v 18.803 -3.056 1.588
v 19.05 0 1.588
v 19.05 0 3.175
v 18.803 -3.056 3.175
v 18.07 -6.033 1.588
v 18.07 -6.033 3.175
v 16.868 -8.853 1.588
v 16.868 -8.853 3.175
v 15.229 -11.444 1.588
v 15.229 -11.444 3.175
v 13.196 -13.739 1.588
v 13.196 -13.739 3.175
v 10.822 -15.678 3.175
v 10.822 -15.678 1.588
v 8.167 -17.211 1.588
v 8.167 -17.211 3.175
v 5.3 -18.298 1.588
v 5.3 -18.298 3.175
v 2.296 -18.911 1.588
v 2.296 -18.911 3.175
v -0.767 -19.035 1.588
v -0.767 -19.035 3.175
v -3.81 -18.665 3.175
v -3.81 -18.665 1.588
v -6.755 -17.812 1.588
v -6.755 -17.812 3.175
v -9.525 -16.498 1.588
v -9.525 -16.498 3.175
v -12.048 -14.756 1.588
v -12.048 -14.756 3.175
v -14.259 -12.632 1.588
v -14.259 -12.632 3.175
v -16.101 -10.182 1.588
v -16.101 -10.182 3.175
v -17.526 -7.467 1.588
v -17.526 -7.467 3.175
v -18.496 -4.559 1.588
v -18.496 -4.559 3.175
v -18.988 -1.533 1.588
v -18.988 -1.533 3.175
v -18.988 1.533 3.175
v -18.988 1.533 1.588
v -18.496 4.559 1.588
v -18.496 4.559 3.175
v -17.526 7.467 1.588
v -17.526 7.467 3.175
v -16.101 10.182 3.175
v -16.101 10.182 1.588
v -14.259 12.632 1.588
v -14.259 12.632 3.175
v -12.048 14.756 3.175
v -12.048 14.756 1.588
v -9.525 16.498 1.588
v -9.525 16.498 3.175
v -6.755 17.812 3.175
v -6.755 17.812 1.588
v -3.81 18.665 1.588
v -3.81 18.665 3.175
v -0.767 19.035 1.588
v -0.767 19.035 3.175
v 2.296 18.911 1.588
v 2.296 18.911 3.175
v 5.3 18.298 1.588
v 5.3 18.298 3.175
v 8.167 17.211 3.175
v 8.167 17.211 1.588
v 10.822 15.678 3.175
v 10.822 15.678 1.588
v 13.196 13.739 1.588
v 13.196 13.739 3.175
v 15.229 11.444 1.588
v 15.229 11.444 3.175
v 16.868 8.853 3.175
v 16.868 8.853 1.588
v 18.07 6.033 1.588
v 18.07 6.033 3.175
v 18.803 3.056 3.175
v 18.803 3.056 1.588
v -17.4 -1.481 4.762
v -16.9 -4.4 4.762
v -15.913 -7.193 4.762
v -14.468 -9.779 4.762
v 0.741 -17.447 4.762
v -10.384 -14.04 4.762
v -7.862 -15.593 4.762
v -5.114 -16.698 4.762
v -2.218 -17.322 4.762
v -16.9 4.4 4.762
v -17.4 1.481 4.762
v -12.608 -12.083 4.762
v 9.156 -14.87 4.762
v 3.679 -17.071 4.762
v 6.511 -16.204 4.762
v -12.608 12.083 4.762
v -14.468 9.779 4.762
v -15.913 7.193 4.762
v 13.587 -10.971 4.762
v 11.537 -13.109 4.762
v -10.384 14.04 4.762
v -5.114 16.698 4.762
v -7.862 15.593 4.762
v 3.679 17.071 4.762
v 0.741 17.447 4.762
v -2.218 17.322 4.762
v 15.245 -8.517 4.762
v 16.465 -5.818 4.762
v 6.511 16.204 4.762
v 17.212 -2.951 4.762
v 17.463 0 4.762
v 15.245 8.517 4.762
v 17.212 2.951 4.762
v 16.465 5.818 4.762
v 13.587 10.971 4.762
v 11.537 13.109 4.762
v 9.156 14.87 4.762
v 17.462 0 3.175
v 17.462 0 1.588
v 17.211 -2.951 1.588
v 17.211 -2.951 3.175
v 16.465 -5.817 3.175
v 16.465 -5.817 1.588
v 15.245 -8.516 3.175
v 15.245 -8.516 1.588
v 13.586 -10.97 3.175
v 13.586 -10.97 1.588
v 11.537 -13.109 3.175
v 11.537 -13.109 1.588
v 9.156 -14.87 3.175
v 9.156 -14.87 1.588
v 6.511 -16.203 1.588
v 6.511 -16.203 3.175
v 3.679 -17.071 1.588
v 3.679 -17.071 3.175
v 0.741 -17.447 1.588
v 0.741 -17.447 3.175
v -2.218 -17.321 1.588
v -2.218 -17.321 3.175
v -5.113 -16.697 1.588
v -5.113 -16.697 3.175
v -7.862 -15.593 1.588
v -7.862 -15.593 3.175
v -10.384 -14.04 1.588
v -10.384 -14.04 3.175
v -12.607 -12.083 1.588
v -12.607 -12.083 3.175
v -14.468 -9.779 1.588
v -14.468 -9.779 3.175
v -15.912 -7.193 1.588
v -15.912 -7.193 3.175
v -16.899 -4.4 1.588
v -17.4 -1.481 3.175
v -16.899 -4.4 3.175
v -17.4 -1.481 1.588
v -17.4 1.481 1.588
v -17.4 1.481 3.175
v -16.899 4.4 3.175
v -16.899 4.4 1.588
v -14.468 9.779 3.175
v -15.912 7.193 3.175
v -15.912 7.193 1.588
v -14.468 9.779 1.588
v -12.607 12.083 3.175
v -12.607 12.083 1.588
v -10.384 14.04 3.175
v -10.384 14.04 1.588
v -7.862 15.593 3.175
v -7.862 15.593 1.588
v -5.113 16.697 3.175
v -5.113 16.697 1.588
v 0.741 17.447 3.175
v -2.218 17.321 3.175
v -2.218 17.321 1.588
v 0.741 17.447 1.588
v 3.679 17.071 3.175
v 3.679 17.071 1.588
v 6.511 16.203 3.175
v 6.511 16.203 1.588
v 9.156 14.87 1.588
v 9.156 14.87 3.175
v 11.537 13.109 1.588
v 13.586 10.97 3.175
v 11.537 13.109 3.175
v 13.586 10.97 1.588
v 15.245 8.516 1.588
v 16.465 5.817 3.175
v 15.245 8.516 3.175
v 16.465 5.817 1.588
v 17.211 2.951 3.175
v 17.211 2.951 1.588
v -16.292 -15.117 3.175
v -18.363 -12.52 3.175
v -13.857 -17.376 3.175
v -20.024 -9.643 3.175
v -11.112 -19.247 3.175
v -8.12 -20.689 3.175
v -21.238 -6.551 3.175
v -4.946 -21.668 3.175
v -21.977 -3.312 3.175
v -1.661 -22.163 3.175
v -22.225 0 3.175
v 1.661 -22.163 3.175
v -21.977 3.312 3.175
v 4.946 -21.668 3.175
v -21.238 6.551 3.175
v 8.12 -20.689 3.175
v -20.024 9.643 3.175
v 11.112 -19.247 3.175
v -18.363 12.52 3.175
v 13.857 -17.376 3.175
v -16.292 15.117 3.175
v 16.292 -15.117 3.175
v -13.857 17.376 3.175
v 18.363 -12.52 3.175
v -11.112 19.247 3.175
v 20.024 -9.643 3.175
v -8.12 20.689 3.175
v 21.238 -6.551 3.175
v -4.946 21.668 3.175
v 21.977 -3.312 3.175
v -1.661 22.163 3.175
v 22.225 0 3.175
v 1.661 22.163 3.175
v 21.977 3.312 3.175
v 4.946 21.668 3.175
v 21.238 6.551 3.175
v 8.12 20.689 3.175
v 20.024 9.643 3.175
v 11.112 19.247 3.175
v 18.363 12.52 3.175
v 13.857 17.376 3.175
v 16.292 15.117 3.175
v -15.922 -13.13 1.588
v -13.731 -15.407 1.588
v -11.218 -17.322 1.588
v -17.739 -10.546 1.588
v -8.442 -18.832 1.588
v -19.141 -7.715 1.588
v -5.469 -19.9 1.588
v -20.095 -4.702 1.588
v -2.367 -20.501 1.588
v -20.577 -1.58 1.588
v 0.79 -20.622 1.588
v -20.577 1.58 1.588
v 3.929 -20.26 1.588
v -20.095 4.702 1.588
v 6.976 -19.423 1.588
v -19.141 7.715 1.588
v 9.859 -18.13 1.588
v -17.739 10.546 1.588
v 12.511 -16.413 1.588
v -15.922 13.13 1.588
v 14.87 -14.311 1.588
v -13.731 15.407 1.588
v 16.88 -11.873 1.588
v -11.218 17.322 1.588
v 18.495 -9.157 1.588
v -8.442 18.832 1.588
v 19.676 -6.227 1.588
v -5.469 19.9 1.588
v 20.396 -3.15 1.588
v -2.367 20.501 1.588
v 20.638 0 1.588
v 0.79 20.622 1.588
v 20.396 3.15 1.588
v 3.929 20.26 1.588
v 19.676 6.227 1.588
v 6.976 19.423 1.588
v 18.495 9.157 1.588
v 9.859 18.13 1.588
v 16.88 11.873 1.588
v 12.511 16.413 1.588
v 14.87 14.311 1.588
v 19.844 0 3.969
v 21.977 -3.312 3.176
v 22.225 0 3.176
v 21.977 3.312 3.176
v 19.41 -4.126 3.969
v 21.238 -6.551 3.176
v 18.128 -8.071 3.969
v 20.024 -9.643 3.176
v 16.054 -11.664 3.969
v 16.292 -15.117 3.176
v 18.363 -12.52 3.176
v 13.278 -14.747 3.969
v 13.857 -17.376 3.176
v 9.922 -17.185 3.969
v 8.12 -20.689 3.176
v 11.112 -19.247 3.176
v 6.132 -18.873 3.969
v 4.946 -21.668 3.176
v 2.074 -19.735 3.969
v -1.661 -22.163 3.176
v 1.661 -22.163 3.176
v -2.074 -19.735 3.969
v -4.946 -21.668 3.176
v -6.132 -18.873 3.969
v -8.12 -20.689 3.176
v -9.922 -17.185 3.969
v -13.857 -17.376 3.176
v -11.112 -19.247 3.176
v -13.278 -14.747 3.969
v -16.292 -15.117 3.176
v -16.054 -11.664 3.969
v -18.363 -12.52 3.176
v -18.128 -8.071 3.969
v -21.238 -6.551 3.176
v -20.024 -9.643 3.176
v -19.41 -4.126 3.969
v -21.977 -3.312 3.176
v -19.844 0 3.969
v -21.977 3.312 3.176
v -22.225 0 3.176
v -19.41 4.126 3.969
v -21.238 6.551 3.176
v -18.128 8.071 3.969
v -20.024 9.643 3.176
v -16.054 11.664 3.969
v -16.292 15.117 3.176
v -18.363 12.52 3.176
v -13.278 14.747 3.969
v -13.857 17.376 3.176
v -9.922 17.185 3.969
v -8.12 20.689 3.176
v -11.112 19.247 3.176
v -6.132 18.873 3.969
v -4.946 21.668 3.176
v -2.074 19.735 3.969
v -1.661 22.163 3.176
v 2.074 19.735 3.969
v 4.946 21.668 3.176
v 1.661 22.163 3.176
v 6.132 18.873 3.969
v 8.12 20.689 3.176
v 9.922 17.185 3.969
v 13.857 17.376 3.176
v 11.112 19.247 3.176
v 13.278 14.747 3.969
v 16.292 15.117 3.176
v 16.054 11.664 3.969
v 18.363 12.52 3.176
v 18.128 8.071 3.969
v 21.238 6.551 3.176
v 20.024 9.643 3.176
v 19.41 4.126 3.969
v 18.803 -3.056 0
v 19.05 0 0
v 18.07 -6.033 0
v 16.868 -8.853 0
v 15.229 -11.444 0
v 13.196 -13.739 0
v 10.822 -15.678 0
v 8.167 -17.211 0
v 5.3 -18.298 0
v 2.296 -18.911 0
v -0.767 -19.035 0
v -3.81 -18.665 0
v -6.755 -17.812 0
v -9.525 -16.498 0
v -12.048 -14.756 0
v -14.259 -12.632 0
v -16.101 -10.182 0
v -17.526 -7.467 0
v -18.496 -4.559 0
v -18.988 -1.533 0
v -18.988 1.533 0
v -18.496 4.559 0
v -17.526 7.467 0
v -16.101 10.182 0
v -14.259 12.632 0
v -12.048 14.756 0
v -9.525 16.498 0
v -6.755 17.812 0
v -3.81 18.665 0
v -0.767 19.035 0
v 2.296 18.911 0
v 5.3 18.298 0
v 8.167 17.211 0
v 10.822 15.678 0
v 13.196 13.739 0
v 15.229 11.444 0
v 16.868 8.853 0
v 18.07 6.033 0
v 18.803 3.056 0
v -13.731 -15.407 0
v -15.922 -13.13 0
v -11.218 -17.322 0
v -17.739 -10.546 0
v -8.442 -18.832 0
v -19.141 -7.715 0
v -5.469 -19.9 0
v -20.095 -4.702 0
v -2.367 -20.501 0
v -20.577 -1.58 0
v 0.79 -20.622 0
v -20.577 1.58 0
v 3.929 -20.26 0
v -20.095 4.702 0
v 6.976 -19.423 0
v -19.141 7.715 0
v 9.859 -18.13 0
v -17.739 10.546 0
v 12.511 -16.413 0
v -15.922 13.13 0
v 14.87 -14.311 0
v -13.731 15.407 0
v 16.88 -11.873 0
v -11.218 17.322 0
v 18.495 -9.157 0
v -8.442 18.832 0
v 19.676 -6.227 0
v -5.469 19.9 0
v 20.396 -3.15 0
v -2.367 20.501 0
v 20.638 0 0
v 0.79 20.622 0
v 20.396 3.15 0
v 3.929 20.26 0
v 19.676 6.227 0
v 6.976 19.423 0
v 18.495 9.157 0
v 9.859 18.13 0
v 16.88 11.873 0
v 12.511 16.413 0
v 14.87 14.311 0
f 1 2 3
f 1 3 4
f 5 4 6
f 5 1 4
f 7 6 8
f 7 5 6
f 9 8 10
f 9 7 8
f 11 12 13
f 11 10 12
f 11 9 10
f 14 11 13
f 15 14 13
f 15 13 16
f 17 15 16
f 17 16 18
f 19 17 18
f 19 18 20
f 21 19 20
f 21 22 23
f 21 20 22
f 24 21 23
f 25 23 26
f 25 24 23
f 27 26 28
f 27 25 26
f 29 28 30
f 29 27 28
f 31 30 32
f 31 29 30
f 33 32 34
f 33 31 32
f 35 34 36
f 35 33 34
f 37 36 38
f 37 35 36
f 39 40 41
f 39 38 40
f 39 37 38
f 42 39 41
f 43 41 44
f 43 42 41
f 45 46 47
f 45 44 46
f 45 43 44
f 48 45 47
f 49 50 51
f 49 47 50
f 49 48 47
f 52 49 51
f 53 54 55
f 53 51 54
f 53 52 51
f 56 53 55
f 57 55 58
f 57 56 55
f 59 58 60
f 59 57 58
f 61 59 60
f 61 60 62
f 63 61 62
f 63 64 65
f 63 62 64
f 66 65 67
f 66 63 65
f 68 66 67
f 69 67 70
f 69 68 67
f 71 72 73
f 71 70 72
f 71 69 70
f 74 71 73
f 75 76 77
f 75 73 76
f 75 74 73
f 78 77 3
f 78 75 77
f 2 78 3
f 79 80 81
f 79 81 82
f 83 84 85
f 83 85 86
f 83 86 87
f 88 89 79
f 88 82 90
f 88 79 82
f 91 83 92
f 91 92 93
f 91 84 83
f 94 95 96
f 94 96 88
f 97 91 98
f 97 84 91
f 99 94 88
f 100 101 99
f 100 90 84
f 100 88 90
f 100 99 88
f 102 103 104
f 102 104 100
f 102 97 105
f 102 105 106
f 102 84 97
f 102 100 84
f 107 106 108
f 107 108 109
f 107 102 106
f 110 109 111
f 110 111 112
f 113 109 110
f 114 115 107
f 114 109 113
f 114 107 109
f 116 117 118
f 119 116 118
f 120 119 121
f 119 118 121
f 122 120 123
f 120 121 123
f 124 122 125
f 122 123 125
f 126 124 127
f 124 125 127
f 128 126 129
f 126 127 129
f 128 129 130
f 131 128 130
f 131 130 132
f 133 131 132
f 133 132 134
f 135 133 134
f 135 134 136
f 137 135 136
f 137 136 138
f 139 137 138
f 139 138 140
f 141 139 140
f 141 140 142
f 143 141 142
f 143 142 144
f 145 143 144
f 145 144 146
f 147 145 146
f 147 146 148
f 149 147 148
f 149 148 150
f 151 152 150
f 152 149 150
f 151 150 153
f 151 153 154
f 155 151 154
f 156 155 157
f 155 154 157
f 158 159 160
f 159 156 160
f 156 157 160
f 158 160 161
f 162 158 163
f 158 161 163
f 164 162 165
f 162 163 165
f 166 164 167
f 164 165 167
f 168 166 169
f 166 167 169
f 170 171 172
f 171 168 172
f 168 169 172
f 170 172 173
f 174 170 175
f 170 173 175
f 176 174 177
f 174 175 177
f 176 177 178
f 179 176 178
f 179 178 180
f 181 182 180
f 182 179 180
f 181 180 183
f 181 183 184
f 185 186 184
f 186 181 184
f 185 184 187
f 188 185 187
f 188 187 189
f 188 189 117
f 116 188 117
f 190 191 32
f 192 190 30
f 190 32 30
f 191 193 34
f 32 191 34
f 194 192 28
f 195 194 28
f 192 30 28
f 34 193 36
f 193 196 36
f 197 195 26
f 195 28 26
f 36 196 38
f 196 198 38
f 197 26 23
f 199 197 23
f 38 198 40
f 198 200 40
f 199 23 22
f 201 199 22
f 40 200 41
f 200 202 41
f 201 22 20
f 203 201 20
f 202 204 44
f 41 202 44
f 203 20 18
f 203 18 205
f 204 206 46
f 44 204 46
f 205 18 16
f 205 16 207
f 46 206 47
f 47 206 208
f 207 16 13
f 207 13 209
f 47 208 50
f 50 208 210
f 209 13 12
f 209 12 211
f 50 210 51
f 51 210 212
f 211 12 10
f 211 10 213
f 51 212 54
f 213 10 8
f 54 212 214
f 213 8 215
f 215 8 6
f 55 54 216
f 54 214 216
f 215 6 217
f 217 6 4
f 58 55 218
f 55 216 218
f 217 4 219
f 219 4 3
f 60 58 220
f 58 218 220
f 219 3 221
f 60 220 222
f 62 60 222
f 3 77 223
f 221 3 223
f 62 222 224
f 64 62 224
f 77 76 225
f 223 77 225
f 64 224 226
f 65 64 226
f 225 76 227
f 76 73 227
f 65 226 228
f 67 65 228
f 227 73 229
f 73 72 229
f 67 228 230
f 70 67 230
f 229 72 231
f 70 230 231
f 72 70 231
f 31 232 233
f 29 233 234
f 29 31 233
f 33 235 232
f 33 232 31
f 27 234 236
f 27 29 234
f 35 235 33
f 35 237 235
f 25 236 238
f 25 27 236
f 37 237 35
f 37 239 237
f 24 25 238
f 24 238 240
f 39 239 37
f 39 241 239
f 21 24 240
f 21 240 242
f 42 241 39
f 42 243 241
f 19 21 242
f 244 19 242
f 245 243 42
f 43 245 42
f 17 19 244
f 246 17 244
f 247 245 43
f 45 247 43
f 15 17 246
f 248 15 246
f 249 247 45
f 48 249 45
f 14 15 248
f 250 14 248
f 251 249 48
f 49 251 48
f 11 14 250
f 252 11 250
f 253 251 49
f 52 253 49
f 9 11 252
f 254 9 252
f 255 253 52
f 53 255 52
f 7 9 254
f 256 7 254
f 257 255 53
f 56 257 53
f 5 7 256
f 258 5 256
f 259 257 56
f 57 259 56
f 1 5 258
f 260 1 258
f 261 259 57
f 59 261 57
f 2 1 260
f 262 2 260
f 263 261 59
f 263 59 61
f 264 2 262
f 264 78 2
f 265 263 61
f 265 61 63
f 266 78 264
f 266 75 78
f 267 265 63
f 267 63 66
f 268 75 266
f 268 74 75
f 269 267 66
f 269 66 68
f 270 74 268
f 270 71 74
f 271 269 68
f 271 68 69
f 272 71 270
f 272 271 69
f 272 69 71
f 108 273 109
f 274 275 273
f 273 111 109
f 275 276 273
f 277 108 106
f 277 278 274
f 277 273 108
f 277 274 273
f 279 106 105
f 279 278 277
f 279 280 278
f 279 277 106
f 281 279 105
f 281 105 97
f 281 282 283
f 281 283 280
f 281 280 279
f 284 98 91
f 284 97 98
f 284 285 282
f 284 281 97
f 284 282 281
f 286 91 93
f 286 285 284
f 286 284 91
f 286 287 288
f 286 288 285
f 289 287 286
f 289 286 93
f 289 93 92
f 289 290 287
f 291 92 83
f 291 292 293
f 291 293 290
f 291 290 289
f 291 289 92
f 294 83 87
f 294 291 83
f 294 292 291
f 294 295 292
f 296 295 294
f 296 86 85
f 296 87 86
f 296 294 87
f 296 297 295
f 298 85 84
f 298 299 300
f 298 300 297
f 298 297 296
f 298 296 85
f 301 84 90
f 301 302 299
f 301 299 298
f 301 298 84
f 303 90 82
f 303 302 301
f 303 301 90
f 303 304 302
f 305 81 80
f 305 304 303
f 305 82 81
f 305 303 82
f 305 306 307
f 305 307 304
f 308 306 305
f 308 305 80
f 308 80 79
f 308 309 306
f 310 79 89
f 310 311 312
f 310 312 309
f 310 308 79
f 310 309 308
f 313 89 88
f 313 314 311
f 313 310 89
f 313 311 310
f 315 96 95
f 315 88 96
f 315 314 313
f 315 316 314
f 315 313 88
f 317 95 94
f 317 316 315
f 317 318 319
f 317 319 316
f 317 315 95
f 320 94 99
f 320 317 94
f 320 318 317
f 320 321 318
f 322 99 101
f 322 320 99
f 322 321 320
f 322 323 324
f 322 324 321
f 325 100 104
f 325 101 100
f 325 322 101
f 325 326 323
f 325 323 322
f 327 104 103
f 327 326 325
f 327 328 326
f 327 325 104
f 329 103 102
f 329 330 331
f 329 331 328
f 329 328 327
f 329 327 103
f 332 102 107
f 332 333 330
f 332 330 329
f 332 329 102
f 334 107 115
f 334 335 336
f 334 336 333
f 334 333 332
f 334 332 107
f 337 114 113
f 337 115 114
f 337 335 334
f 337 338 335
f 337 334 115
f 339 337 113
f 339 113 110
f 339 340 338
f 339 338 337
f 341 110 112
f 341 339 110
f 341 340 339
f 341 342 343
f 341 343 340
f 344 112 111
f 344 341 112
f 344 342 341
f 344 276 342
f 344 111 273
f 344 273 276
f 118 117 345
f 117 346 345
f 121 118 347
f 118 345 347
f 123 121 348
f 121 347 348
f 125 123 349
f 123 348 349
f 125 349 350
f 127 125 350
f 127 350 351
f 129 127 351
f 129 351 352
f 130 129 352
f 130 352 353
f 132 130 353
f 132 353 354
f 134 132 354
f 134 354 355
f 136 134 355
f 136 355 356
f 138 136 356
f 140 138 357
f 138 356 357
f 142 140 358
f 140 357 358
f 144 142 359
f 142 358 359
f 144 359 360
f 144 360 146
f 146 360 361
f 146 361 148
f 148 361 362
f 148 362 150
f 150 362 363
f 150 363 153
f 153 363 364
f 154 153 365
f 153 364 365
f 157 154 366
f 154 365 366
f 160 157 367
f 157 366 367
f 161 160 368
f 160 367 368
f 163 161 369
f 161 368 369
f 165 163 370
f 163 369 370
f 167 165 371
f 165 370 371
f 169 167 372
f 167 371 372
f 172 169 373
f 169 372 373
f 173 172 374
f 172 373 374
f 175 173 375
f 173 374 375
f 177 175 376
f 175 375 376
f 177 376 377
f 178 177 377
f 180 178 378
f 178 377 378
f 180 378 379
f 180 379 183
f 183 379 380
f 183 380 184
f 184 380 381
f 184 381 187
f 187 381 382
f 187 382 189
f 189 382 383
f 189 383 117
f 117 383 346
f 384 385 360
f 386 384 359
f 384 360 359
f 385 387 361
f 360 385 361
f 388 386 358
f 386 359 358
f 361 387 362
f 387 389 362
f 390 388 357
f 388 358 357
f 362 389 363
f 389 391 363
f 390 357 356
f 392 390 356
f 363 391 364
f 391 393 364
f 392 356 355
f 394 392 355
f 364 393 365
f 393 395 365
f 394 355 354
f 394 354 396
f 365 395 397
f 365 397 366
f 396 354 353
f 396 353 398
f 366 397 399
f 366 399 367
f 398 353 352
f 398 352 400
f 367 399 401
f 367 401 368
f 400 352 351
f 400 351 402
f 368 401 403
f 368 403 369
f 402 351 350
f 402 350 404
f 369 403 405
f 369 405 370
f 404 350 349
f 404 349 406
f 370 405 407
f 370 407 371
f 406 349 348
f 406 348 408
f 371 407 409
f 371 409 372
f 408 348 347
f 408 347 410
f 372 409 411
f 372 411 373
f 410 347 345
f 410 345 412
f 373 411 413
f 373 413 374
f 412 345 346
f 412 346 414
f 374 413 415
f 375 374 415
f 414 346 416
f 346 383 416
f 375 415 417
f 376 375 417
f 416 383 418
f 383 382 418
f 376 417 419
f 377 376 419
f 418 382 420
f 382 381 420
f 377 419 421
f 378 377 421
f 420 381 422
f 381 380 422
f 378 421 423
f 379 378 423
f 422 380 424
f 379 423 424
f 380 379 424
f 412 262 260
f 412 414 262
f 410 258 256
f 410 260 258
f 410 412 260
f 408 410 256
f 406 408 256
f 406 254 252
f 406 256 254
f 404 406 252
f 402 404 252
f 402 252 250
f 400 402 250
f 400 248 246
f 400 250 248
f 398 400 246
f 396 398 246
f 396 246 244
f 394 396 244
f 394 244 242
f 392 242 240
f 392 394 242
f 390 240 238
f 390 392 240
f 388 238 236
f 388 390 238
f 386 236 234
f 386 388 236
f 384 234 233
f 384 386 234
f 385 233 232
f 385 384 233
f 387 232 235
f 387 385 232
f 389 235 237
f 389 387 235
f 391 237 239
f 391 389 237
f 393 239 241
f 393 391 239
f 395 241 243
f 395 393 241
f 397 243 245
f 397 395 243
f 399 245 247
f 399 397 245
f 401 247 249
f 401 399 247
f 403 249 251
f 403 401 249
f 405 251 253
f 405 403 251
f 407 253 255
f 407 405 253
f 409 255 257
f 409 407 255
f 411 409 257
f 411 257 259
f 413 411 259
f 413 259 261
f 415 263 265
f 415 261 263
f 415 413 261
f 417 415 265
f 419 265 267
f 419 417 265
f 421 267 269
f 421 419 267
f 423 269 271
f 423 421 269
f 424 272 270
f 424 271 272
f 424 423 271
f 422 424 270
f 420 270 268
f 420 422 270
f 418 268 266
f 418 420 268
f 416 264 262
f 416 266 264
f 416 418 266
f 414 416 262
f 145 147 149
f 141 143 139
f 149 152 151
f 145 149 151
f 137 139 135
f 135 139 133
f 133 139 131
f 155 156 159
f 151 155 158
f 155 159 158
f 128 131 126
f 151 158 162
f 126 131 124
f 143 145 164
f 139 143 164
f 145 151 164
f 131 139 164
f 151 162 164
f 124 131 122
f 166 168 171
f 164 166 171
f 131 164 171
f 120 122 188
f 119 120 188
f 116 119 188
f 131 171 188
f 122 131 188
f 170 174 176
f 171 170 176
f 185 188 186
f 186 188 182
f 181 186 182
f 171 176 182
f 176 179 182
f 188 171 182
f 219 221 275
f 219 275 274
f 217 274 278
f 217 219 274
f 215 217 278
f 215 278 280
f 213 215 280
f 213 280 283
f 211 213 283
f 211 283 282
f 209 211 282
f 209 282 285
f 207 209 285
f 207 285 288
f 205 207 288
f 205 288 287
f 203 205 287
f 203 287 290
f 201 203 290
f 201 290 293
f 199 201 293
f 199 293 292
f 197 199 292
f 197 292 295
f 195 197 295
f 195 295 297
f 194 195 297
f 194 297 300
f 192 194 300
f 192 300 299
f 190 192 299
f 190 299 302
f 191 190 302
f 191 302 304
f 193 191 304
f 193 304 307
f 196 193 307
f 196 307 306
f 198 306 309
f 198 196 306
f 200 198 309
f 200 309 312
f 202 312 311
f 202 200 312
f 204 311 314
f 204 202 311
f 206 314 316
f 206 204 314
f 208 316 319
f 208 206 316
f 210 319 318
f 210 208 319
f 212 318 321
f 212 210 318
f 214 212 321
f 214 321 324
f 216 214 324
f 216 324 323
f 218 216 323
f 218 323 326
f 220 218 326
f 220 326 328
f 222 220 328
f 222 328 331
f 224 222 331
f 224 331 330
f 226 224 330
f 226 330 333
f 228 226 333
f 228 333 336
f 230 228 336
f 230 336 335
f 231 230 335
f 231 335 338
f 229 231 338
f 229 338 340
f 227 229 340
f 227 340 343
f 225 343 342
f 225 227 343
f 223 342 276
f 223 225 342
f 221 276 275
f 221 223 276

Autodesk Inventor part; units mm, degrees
ref_plane "YZ Plane" through (0, 0, 0) normal (1, 0, 0) x (0, 1, 0)
ref_plane "XZ Plane" through (0, 0, 0) normal (0, 1, 0) x (-1, 0, 0)
ref_plane "XY Plane" through (0, 0, 0) normal (0, 0, 1) x (1, 0, 0)
sketch "Sketch1" plane through (0, 0, 0) normal (0, 0, 1) x (1, 0, 0)
  circle A0 centre (0, 0) radius 20.6375
  circle A1 centre (0, 0) radius 17.4625
  dimension "d0" = 41.275
  dimension "d1" = 34.925
extrude "Extrusion1" add sketch "Sketch1" along normal blind 1.5875
sketch "Sketch2" plane through (0, 0, 1.5875) normal (0, 0, 1) x (1, 0, 0)
  circle A0 centre (0, 0) radius 17.4625 projected
  circle A1 centre (0, 0) radius 20.6375 projected
  circle A2 centre (0, 0) radius 19.05
  dimension "d4" = 38.1
extrude "Extrusion2" add sketch "Sketch2" along normal blind 1.5875 contours A2
sketch "Sketch3" plane through (0, 0, 3.175) normal (0, 0, 1) x (1, 0, 0)
  circle A0 centre (0, 0) radius 19.05 projected
  circle A1 centre (0, 0) radius 22.225
  dimension "d7" = 44.45
extrude "Extrusion3" add sketch "Sketch3" along normal blind 1.5875 contours A0 | A1
chamfer "Chamfer1" distance 4.7625 distance2 1.5875 1 edges at (-22.225, 0, 4.7625) measured on face at (2.0252, -4.4852, 4.7625)
chamfer "Chamfer2" distance 1.5875 angle 45 1 edges at (-17.4625, 0, 0)
properties part number "Plastic Plug" material "Plastic, Opaque Black"
